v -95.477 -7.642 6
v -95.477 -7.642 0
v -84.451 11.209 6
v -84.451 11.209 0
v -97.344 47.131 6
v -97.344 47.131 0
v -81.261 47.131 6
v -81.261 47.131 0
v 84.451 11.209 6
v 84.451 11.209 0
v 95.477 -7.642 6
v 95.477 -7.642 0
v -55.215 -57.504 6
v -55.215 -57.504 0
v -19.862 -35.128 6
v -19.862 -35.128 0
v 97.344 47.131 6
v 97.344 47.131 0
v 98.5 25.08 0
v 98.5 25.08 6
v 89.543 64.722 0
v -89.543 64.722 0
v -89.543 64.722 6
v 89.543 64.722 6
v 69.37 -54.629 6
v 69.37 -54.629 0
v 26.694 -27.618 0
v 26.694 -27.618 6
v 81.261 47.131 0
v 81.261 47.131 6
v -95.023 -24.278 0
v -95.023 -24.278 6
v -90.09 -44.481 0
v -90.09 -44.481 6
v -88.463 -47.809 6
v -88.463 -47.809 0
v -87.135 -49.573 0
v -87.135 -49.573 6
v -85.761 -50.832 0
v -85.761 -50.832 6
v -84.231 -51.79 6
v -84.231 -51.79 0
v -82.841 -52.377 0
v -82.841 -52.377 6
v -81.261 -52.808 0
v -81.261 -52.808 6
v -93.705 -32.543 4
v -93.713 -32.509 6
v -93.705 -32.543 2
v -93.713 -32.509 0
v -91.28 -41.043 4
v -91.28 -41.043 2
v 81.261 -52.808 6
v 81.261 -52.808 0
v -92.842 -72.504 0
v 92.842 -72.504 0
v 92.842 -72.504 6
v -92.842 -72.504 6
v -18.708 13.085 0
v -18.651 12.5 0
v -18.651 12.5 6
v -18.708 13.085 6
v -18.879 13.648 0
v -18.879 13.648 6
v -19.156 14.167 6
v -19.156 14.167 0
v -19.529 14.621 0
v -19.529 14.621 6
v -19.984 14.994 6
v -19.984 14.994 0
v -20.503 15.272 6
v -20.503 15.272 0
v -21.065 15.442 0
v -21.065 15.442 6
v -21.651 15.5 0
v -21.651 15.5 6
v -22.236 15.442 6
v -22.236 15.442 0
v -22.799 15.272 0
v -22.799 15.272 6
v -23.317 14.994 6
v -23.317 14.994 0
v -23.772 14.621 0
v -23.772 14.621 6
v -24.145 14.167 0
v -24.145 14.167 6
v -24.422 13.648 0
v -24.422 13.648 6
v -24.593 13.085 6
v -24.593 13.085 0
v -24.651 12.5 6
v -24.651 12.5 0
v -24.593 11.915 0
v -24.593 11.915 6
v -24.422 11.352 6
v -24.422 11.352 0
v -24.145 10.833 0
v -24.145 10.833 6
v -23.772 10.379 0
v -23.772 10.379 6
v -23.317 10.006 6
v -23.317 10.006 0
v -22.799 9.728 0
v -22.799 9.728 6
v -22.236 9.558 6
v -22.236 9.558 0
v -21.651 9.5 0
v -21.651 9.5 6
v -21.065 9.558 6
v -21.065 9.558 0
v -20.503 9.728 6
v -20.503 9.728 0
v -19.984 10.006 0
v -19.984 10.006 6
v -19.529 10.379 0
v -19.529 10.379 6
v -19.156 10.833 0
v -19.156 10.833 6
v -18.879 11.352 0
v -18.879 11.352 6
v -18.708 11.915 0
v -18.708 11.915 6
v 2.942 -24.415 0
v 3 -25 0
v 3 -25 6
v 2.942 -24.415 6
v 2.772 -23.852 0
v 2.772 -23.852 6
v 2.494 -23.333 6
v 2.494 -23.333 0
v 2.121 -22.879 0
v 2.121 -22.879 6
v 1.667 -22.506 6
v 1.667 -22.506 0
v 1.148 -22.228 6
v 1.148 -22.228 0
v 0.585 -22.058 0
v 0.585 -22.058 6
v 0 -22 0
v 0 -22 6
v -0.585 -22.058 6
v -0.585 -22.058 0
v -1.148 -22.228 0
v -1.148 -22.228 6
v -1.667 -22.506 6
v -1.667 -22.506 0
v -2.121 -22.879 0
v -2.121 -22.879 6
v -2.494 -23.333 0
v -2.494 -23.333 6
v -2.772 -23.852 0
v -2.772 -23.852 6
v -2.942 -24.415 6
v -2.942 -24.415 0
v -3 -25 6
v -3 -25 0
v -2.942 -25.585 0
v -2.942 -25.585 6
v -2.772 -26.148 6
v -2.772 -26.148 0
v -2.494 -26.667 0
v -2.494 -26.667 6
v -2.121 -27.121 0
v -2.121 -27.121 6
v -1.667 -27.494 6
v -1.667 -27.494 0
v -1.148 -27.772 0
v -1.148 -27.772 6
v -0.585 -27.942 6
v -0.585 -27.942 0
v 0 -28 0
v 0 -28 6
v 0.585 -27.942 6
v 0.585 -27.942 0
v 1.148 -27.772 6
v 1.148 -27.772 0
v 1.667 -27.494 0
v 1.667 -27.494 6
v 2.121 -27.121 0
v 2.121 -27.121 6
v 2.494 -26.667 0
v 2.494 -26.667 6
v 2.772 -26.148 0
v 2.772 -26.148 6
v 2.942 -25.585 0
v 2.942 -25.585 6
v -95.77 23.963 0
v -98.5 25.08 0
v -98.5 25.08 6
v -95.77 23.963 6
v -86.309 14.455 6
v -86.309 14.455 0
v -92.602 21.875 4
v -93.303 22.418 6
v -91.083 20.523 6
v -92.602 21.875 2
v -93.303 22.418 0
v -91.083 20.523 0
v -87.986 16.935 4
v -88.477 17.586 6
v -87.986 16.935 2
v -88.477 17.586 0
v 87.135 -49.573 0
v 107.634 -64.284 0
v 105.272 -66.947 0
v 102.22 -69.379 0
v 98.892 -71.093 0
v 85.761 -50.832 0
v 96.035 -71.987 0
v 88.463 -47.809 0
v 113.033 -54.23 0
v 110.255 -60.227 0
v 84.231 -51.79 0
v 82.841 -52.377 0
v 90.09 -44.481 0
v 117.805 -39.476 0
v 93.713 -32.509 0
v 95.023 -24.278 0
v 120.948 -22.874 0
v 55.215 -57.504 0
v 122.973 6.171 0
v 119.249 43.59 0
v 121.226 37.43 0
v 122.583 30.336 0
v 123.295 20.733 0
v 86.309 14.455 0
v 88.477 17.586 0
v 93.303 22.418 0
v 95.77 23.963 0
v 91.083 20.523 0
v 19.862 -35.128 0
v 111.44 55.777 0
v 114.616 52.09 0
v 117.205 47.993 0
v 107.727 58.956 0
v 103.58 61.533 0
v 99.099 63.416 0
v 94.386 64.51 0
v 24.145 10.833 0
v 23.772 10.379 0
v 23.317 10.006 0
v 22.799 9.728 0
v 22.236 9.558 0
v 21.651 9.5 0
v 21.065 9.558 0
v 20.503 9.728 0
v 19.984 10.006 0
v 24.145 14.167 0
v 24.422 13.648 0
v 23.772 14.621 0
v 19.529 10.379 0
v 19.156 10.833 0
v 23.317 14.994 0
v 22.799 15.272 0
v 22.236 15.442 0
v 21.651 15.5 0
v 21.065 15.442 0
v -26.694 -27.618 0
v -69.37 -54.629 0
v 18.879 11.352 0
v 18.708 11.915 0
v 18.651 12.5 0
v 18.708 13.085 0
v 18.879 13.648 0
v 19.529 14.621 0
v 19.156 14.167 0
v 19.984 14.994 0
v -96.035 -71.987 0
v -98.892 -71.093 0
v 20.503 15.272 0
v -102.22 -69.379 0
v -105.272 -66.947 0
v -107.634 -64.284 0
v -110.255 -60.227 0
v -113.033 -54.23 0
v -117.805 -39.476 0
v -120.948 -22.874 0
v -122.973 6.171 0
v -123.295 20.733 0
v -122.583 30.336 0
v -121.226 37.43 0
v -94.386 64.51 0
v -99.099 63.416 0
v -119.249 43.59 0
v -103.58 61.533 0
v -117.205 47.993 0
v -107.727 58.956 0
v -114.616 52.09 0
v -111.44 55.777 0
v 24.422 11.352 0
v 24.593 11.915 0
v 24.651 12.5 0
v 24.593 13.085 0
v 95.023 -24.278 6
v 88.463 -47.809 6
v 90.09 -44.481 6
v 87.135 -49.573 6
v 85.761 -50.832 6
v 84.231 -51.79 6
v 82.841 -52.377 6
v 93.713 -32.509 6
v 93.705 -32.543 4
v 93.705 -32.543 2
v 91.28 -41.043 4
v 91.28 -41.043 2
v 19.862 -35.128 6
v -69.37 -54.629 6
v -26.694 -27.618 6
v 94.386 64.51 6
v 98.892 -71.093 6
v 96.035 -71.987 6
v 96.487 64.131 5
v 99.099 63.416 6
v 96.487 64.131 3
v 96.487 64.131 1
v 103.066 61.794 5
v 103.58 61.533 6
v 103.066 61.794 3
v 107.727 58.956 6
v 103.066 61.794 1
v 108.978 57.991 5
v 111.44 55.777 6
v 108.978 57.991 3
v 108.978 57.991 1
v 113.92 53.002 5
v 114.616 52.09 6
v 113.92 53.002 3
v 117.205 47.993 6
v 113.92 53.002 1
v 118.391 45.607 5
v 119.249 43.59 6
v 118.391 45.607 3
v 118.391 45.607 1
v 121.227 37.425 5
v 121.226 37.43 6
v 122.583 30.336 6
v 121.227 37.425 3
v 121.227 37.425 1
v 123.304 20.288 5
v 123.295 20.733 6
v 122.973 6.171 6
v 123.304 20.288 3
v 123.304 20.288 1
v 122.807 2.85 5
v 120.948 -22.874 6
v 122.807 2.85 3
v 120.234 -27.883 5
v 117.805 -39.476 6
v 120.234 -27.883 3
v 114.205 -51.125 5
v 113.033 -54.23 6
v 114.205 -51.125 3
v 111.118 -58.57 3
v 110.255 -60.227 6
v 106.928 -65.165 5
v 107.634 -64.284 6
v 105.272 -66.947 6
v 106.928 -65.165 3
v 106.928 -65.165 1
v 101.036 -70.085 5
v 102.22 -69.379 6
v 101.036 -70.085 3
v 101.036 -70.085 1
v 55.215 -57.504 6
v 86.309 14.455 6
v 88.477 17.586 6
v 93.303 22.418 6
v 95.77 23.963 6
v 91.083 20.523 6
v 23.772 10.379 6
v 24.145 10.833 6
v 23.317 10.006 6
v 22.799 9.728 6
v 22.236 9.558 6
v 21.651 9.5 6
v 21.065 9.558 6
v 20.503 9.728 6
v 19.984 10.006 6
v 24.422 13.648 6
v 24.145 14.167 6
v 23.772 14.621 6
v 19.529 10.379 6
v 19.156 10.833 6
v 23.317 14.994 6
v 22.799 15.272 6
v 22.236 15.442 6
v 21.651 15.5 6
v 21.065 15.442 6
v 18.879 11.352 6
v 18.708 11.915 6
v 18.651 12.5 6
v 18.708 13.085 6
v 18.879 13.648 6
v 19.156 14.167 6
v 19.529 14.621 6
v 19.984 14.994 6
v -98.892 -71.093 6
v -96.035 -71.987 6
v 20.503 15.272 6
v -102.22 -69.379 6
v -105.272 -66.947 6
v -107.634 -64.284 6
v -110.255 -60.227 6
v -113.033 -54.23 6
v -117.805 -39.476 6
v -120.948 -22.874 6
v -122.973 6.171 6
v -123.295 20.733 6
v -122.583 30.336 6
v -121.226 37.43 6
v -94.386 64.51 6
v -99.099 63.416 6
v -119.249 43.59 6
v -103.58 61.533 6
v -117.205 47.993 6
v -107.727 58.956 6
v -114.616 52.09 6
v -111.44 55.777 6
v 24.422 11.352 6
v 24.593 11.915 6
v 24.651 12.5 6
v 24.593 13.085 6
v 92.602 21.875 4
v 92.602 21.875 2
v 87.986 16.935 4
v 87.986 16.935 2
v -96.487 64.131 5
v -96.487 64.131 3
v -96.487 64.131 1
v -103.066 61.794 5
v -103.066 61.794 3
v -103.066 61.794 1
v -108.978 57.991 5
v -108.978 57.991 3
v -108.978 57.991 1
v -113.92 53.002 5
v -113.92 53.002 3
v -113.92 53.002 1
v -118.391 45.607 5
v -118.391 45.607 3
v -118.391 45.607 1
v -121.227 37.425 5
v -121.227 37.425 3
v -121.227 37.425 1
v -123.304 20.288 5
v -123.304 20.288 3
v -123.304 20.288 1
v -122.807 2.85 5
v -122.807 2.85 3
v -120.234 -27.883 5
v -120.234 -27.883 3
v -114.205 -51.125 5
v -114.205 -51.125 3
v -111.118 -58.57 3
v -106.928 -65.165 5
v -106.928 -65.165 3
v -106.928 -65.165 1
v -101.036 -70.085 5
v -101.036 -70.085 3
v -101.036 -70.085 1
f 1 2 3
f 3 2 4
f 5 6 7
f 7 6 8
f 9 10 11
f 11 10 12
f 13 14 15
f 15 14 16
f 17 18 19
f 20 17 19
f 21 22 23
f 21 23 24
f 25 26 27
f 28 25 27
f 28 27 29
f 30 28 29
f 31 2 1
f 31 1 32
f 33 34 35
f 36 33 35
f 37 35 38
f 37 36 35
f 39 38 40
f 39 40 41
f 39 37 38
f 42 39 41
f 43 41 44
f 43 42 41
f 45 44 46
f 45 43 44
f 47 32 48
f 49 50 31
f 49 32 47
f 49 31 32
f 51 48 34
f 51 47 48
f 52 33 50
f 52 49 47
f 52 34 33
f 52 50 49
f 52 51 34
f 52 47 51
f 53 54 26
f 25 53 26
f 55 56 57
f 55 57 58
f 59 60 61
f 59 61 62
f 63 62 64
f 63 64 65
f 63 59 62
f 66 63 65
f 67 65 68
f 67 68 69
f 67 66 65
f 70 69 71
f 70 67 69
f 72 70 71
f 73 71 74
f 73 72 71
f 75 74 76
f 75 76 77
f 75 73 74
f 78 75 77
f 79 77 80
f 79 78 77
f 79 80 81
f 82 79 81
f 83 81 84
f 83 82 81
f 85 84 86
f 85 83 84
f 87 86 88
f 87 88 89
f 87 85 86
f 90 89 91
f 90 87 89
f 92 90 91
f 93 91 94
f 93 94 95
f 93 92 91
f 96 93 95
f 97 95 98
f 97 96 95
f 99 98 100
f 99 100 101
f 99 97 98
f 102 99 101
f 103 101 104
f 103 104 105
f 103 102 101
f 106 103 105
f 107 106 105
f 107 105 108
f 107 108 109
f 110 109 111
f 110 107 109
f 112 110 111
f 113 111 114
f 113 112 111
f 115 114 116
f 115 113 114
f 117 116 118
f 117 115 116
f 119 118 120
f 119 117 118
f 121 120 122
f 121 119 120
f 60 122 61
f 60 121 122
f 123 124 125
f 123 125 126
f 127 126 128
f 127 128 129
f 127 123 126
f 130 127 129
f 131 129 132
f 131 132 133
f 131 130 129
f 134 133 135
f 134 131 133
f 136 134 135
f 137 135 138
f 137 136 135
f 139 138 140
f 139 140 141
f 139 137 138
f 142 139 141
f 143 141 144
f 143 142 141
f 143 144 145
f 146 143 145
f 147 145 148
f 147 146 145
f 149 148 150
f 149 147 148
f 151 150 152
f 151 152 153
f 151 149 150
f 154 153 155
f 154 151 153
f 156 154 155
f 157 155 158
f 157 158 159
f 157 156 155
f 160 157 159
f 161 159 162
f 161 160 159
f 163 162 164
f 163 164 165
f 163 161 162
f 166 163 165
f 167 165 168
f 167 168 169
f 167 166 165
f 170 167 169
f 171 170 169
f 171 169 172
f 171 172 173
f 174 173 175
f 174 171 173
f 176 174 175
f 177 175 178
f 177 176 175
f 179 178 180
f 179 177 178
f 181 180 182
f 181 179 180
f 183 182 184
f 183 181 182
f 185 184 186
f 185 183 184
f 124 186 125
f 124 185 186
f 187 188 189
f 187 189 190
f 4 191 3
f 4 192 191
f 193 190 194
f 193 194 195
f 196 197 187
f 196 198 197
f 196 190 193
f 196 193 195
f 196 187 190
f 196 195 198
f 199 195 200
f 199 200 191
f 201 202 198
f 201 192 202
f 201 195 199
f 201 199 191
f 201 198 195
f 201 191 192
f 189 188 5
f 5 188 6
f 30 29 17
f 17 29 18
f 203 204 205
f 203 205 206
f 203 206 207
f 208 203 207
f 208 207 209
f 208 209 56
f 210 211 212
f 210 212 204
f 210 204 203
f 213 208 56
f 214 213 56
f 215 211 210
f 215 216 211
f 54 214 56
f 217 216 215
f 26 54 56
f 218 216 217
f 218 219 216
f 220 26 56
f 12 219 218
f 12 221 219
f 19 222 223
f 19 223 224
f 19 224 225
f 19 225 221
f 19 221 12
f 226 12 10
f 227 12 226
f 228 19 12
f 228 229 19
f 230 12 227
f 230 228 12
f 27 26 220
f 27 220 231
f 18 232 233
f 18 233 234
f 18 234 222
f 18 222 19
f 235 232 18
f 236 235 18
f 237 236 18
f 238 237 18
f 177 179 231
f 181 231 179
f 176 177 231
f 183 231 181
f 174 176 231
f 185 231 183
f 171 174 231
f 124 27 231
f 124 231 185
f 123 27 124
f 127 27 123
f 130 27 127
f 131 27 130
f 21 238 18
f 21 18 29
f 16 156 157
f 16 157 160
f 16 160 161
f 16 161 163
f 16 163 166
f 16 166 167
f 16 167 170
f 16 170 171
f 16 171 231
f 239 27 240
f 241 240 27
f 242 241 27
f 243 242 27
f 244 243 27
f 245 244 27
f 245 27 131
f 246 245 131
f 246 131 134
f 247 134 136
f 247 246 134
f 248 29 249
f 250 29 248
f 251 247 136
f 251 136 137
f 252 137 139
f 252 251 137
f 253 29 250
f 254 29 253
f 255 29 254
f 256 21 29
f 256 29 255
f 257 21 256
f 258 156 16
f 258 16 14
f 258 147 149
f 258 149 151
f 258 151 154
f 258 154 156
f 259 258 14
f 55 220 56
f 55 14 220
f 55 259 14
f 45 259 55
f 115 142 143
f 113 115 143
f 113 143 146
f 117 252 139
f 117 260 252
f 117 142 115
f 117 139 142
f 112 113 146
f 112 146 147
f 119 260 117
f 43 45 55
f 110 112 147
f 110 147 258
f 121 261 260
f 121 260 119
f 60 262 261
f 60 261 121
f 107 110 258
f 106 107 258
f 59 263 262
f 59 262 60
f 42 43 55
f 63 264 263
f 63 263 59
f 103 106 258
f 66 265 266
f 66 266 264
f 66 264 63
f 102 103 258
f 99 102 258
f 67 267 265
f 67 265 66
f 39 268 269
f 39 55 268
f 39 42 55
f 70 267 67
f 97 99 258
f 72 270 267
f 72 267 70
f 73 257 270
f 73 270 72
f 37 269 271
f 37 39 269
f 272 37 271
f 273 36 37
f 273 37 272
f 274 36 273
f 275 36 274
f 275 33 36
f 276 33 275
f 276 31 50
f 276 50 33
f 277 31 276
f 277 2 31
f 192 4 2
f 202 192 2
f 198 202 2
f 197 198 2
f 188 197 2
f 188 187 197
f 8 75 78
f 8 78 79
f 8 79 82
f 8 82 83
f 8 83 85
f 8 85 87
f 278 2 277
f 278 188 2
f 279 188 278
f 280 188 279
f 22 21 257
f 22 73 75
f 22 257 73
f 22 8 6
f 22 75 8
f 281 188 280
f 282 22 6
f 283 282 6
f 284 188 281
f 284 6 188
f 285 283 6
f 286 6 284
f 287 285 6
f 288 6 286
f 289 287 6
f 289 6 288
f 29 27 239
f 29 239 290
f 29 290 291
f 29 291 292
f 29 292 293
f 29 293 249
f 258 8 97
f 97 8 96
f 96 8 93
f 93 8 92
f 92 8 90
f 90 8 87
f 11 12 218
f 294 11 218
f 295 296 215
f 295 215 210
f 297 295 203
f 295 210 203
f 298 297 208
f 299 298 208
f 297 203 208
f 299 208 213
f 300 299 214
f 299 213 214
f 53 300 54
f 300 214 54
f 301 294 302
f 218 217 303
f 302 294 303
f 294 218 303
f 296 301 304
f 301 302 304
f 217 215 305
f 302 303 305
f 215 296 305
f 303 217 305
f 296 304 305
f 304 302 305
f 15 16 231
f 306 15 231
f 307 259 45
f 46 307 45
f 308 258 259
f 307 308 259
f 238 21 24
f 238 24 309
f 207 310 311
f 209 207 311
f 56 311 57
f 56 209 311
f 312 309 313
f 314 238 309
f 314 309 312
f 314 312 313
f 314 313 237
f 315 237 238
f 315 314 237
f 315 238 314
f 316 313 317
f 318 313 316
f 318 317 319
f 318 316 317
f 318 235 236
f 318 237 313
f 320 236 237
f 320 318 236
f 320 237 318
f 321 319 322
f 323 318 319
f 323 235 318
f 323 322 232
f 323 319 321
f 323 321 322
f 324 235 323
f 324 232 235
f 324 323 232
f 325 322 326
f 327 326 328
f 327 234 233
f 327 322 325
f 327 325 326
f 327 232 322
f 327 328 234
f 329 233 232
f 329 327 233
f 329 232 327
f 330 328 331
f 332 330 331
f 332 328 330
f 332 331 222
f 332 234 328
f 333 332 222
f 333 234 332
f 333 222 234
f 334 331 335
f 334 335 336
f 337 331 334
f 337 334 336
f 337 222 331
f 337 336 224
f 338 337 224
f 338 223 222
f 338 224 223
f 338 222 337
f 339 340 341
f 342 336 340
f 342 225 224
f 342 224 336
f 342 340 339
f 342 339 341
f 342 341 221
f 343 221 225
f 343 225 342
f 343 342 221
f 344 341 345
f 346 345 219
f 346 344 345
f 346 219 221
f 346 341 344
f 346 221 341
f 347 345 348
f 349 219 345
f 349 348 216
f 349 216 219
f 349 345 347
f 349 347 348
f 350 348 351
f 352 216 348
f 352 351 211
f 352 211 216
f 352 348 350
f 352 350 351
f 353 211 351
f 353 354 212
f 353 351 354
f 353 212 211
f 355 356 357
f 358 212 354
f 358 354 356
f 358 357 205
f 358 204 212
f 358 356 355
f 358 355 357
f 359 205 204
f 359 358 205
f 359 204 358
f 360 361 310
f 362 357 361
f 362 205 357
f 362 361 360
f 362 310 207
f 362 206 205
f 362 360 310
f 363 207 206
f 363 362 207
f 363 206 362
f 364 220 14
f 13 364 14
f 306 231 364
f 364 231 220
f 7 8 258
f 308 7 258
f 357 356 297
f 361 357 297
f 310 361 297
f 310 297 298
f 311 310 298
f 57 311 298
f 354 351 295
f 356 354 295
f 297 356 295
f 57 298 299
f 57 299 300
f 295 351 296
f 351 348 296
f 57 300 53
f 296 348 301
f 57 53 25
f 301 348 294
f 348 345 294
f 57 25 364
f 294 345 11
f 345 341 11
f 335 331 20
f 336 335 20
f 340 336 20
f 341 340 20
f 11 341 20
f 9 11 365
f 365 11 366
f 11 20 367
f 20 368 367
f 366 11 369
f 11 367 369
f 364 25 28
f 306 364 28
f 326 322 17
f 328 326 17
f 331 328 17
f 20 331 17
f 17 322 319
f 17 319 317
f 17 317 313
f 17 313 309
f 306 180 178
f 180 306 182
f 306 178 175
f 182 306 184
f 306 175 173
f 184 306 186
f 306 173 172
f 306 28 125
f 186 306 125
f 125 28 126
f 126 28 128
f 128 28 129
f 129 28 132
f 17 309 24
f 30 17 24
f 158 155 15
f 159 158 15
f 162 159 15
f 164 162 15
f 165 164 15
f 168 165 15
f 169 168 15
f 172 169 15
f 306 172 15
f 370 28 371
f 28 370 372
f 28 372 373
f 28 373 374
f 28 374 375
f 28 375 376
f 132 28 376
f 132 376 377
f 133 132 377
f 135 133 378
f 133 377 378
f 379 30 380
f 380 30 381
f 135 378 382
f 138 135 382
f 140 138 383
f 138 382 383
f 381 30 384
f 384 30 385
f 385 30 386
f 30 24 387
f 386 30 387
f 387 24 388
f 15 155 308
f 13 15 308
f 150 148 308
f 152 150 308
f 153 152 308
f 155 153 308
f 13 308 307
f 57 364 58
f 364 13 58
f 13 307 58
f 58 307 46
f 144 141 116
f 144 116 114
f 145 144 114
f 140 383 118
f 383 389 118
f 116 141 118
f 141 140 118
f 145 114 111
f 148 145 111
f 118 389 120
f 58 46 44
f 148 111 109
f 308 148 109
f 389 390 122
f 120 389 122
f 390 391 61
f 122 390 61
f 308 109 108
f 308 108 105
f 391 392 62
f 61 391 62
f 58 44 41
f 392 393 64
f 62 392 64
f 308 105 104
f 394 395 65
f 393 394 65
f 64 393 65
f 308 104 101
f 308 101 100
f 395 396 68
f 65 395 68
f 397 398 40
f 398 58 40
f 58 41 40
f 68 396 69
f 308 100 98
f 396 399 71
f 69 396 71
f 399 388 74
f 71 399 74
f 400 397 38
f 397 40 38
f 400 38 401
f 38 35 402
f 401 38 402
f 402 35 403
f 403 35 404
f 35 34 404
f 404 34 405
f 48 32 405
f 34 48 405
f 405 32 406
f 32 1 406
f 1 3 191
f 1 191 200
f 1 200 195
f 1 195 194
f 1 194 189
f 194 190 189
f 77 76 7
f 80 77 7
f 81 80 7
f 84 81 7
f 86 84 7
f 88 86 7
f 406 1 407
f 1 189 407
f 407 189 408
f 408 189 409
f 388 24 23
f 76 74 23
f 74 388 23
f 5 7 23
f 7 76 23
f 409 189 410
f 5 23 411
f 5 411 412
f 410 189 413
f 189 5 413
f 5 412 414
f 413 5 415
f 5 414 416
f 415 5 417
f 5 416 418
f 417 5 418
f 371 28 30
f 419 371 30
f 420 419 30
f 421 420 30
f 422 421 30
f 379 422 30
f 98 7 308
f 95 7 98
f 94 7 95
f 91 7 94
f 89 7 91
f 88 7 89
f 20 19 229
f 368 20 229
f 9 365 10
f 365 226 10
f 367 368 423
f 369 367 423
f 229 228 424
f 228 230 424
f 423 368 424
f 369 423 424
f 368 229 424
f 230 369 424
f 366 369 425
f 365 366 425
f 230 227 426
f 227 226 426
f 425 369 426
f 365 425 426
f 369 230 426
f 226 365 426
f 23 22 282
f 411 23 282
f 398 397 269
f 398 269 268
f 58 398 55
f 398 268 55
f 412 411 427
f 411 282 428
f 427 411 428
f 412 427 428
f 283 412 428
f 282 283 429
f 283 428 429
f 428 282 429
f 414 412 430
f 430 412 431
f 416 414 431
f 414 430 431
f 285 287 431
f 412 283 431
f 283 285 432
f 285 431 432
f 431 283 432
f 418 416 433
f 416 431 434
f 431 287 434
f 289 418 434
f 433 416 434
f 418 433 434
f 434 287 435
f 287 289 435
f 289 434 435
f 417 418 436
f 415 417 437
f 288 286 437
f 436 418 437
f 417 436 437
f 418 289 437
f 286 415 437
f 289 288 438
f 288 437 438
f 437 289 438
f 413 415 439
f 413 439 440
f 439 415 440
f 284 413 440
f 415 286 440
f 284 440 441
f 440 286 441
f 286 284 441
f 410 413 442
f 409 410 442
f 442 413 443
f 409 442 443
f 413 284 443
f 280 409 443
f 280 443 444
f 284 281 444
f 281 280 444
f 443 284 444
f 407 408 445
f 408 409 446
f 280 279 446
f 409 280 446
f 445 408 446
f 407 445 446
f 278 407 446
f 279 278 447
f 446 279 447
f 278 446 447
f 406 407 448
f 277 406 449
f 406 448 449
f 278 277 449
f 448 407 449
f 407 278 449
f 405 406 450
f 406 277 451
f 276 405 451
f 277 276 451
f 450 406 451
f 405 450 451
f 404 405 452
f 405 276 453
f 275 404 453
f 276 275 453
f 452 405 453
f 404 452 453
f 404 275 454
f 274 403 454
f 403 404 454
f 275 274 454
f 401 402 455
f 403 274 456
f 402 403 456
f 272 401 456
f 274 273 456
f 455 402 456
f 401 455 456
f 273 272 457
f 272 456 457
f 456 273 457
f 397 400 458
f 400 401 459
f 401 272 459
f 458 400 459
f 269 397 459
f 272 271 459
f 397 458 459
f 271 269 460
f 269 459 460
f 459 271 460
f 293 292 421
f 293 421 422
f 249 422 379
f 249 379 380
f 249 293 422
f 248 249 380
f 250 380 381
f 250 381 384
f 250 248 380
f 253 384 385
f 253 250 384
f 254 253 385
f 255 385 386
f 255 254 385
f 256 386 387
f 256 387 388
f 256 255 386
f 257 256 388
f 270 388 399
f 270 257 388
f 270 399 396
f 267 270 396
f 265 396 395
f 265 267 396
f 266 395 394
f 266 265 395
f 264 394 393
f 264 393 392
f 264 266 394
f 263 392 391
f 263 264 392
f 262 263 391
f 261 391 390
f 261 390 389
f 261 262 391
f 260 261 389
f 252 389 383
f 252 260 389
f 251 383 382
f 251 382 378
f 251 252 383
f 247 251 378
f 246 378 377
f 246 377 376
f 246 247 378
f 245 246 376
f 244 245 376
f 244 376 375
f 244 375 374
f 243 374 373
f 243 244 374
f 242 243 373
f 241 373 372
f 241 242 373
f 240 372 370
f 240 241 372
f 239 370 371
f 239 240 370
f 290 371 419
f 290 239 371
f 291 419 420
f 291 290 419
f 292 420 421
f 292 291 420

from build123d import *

# Parameters (mm, degrees)
SKETCH1_R           = 3
BOSS_EXTRUDE1_DEPTH = 6


with BuildPart() as part:
    # Sketch1 → Boss-Extrude1 (new body)
    with BuildSketch(Plane.XY):
        with BuildLine():
            Line((92.841871249, -72.503941705), (-92.841871249, -72.503941705))
            add(Edge.make_bspline(
                [(-89.54335041, 64.722361891), (-98.90871893, 65.221288052), (-113.81480539, 57.284527757), (-124.422620364, 32.021117456), (-122.771348874, 4.038133367), (-121.528600594, -25.817527247), (-114.338873962, -53.627324125), (-105.568117143, -71.312185373), (-92.841871249, -72.503941705)],
                knots=[0, 0, 0, 0, 0.167204326, 0.270778215, 0.47913381, 0.664790472, 0.809328273, 1, 1, 1, 1], degree=3))
            Line((-89.54335041, 64.722361891), (89.54335041, 64.722361891))
            add(Edge.make_bspline(
                [(89.54335041, 64.722361891), (98.90871893, 65.221288052), (113.81480539, 57.284527757), (124.422620364, 32.021117456), (122.771348874, 4.038133367), (121.528600594, -25.817527247), (114.338873962, -53.627324125), (105.568117143, -71.312185373), (92.841871249, -72.503941705)],
                knots=[0, 0, 0, 0, 0.167204326, 0.270778215, 0.47913381, 0.664790472, 0.809328273, 1, 1, 1, 1], degree=3))
        make_face()
        with Locations((-21.650635095, 12.5)):
            Circle(SKETCH1_R, mode=Mode.SUBTRACT)
        with Locations((21.650635095, 12.5)):
            Circle(SKETCH1_R, mode=Mode.SUBTRACT)
        with Locations((0, -25)):
            Circle(SKETCH1_R, mode=Mode.SUBTRACT)
        with BuildLine():
            Line((97.34394992, 47.131251227), (98.499872101, 25.079812686))
            add(Edge.make_bspline(
                [(98.499872101, 25.079812686), (91.893678399, 23.057749928), (87.513780679, 17.013291572), (84.45097174, 11.208746507)],
                knots=[0, 0, 0, 0, 1, 1, 1, 1], degree=3))
            Line((84.45097174, 11.208746507), (95.476691011, -7.641676762))
            add(Edge.make_bspline(
                [(95.476691011, -7.641676762), (95.652402082, -15.857734775), (95.502353613, -27.478143499), (90.619630404, -43.300604068), (87.814539084, -51.453126083), (81.260626519, -52.808002251)],
                knots=[0, 0, 0, 0, 0.501052944, 0.6781501, 1, 1, 1, 1], degree=3))
            Line((81.260626519, -52.808002251), (69.370032777, -54.628626567))
            Line((69.370032777, -54.628626567), (26.69421199, -27.617833137))
            Line((26.69421199, -27.617833137), (81.260626519, 47.131251227))
            Line((81.260626519, 47.131251227), (97.34394992, 47.131251227))
        make_face(mode=Mode.SUBTRACT)
        Polygon((-19.861614429, -35.127974027), (19.861614429, -35.127974027), (55.214622071, -57.503941705), (-55.214622071, -57.503941705), align=None, mode=Mode.SUBTRACT)
        with BuildLine():
            Line((-97.34394992, 47.131251227), (-81.260626519, 47.131251227))
            Line((-81.260626519, 47.131251227), (-26.69421199, -27.617833137))
            Line((-26.69421199, -27.617833137), (-69.370032777, -54.628626567))
            Line((-69.370032777, -54.628626567), (-81.260626519, -52.808002251))
            add(Edge.make_bspline(
                [(-95.476691011, -7.641676762), (-95.652402082, -15.857734775), (-95.502353613, -27.478143499), (-90.619630404, -43.300604068), (-87.814539084, -51.453126083), (-81.260626519, -52.808002251)],
                knots=[0, 0, 0, 0, 0.501052944, 0.6781501, 1, 1, 1, 1], degree=3))
            Line((-95.476691011, -7.641676762), (-84.45097174, 11.208746507))
            add(Edge.make_bspline(
                [(-98.499872101, 25.079812686), (-91.893678399, 23.057749928), (-87.513780679, 17.013291572), (-84.45097174, 11.208746507)],
                knots=[0, 0, 0, 0, 1, 1, 1, 1], degree=3))
            Line((-98.499872101, 25.079812686), (-97.34394992, 47.131251227))
        make_face(mode=Mode.SUBTRACT)
    extrude(amount=BOSS_EXTRUDE1_DEPTH)


solid = part.part
